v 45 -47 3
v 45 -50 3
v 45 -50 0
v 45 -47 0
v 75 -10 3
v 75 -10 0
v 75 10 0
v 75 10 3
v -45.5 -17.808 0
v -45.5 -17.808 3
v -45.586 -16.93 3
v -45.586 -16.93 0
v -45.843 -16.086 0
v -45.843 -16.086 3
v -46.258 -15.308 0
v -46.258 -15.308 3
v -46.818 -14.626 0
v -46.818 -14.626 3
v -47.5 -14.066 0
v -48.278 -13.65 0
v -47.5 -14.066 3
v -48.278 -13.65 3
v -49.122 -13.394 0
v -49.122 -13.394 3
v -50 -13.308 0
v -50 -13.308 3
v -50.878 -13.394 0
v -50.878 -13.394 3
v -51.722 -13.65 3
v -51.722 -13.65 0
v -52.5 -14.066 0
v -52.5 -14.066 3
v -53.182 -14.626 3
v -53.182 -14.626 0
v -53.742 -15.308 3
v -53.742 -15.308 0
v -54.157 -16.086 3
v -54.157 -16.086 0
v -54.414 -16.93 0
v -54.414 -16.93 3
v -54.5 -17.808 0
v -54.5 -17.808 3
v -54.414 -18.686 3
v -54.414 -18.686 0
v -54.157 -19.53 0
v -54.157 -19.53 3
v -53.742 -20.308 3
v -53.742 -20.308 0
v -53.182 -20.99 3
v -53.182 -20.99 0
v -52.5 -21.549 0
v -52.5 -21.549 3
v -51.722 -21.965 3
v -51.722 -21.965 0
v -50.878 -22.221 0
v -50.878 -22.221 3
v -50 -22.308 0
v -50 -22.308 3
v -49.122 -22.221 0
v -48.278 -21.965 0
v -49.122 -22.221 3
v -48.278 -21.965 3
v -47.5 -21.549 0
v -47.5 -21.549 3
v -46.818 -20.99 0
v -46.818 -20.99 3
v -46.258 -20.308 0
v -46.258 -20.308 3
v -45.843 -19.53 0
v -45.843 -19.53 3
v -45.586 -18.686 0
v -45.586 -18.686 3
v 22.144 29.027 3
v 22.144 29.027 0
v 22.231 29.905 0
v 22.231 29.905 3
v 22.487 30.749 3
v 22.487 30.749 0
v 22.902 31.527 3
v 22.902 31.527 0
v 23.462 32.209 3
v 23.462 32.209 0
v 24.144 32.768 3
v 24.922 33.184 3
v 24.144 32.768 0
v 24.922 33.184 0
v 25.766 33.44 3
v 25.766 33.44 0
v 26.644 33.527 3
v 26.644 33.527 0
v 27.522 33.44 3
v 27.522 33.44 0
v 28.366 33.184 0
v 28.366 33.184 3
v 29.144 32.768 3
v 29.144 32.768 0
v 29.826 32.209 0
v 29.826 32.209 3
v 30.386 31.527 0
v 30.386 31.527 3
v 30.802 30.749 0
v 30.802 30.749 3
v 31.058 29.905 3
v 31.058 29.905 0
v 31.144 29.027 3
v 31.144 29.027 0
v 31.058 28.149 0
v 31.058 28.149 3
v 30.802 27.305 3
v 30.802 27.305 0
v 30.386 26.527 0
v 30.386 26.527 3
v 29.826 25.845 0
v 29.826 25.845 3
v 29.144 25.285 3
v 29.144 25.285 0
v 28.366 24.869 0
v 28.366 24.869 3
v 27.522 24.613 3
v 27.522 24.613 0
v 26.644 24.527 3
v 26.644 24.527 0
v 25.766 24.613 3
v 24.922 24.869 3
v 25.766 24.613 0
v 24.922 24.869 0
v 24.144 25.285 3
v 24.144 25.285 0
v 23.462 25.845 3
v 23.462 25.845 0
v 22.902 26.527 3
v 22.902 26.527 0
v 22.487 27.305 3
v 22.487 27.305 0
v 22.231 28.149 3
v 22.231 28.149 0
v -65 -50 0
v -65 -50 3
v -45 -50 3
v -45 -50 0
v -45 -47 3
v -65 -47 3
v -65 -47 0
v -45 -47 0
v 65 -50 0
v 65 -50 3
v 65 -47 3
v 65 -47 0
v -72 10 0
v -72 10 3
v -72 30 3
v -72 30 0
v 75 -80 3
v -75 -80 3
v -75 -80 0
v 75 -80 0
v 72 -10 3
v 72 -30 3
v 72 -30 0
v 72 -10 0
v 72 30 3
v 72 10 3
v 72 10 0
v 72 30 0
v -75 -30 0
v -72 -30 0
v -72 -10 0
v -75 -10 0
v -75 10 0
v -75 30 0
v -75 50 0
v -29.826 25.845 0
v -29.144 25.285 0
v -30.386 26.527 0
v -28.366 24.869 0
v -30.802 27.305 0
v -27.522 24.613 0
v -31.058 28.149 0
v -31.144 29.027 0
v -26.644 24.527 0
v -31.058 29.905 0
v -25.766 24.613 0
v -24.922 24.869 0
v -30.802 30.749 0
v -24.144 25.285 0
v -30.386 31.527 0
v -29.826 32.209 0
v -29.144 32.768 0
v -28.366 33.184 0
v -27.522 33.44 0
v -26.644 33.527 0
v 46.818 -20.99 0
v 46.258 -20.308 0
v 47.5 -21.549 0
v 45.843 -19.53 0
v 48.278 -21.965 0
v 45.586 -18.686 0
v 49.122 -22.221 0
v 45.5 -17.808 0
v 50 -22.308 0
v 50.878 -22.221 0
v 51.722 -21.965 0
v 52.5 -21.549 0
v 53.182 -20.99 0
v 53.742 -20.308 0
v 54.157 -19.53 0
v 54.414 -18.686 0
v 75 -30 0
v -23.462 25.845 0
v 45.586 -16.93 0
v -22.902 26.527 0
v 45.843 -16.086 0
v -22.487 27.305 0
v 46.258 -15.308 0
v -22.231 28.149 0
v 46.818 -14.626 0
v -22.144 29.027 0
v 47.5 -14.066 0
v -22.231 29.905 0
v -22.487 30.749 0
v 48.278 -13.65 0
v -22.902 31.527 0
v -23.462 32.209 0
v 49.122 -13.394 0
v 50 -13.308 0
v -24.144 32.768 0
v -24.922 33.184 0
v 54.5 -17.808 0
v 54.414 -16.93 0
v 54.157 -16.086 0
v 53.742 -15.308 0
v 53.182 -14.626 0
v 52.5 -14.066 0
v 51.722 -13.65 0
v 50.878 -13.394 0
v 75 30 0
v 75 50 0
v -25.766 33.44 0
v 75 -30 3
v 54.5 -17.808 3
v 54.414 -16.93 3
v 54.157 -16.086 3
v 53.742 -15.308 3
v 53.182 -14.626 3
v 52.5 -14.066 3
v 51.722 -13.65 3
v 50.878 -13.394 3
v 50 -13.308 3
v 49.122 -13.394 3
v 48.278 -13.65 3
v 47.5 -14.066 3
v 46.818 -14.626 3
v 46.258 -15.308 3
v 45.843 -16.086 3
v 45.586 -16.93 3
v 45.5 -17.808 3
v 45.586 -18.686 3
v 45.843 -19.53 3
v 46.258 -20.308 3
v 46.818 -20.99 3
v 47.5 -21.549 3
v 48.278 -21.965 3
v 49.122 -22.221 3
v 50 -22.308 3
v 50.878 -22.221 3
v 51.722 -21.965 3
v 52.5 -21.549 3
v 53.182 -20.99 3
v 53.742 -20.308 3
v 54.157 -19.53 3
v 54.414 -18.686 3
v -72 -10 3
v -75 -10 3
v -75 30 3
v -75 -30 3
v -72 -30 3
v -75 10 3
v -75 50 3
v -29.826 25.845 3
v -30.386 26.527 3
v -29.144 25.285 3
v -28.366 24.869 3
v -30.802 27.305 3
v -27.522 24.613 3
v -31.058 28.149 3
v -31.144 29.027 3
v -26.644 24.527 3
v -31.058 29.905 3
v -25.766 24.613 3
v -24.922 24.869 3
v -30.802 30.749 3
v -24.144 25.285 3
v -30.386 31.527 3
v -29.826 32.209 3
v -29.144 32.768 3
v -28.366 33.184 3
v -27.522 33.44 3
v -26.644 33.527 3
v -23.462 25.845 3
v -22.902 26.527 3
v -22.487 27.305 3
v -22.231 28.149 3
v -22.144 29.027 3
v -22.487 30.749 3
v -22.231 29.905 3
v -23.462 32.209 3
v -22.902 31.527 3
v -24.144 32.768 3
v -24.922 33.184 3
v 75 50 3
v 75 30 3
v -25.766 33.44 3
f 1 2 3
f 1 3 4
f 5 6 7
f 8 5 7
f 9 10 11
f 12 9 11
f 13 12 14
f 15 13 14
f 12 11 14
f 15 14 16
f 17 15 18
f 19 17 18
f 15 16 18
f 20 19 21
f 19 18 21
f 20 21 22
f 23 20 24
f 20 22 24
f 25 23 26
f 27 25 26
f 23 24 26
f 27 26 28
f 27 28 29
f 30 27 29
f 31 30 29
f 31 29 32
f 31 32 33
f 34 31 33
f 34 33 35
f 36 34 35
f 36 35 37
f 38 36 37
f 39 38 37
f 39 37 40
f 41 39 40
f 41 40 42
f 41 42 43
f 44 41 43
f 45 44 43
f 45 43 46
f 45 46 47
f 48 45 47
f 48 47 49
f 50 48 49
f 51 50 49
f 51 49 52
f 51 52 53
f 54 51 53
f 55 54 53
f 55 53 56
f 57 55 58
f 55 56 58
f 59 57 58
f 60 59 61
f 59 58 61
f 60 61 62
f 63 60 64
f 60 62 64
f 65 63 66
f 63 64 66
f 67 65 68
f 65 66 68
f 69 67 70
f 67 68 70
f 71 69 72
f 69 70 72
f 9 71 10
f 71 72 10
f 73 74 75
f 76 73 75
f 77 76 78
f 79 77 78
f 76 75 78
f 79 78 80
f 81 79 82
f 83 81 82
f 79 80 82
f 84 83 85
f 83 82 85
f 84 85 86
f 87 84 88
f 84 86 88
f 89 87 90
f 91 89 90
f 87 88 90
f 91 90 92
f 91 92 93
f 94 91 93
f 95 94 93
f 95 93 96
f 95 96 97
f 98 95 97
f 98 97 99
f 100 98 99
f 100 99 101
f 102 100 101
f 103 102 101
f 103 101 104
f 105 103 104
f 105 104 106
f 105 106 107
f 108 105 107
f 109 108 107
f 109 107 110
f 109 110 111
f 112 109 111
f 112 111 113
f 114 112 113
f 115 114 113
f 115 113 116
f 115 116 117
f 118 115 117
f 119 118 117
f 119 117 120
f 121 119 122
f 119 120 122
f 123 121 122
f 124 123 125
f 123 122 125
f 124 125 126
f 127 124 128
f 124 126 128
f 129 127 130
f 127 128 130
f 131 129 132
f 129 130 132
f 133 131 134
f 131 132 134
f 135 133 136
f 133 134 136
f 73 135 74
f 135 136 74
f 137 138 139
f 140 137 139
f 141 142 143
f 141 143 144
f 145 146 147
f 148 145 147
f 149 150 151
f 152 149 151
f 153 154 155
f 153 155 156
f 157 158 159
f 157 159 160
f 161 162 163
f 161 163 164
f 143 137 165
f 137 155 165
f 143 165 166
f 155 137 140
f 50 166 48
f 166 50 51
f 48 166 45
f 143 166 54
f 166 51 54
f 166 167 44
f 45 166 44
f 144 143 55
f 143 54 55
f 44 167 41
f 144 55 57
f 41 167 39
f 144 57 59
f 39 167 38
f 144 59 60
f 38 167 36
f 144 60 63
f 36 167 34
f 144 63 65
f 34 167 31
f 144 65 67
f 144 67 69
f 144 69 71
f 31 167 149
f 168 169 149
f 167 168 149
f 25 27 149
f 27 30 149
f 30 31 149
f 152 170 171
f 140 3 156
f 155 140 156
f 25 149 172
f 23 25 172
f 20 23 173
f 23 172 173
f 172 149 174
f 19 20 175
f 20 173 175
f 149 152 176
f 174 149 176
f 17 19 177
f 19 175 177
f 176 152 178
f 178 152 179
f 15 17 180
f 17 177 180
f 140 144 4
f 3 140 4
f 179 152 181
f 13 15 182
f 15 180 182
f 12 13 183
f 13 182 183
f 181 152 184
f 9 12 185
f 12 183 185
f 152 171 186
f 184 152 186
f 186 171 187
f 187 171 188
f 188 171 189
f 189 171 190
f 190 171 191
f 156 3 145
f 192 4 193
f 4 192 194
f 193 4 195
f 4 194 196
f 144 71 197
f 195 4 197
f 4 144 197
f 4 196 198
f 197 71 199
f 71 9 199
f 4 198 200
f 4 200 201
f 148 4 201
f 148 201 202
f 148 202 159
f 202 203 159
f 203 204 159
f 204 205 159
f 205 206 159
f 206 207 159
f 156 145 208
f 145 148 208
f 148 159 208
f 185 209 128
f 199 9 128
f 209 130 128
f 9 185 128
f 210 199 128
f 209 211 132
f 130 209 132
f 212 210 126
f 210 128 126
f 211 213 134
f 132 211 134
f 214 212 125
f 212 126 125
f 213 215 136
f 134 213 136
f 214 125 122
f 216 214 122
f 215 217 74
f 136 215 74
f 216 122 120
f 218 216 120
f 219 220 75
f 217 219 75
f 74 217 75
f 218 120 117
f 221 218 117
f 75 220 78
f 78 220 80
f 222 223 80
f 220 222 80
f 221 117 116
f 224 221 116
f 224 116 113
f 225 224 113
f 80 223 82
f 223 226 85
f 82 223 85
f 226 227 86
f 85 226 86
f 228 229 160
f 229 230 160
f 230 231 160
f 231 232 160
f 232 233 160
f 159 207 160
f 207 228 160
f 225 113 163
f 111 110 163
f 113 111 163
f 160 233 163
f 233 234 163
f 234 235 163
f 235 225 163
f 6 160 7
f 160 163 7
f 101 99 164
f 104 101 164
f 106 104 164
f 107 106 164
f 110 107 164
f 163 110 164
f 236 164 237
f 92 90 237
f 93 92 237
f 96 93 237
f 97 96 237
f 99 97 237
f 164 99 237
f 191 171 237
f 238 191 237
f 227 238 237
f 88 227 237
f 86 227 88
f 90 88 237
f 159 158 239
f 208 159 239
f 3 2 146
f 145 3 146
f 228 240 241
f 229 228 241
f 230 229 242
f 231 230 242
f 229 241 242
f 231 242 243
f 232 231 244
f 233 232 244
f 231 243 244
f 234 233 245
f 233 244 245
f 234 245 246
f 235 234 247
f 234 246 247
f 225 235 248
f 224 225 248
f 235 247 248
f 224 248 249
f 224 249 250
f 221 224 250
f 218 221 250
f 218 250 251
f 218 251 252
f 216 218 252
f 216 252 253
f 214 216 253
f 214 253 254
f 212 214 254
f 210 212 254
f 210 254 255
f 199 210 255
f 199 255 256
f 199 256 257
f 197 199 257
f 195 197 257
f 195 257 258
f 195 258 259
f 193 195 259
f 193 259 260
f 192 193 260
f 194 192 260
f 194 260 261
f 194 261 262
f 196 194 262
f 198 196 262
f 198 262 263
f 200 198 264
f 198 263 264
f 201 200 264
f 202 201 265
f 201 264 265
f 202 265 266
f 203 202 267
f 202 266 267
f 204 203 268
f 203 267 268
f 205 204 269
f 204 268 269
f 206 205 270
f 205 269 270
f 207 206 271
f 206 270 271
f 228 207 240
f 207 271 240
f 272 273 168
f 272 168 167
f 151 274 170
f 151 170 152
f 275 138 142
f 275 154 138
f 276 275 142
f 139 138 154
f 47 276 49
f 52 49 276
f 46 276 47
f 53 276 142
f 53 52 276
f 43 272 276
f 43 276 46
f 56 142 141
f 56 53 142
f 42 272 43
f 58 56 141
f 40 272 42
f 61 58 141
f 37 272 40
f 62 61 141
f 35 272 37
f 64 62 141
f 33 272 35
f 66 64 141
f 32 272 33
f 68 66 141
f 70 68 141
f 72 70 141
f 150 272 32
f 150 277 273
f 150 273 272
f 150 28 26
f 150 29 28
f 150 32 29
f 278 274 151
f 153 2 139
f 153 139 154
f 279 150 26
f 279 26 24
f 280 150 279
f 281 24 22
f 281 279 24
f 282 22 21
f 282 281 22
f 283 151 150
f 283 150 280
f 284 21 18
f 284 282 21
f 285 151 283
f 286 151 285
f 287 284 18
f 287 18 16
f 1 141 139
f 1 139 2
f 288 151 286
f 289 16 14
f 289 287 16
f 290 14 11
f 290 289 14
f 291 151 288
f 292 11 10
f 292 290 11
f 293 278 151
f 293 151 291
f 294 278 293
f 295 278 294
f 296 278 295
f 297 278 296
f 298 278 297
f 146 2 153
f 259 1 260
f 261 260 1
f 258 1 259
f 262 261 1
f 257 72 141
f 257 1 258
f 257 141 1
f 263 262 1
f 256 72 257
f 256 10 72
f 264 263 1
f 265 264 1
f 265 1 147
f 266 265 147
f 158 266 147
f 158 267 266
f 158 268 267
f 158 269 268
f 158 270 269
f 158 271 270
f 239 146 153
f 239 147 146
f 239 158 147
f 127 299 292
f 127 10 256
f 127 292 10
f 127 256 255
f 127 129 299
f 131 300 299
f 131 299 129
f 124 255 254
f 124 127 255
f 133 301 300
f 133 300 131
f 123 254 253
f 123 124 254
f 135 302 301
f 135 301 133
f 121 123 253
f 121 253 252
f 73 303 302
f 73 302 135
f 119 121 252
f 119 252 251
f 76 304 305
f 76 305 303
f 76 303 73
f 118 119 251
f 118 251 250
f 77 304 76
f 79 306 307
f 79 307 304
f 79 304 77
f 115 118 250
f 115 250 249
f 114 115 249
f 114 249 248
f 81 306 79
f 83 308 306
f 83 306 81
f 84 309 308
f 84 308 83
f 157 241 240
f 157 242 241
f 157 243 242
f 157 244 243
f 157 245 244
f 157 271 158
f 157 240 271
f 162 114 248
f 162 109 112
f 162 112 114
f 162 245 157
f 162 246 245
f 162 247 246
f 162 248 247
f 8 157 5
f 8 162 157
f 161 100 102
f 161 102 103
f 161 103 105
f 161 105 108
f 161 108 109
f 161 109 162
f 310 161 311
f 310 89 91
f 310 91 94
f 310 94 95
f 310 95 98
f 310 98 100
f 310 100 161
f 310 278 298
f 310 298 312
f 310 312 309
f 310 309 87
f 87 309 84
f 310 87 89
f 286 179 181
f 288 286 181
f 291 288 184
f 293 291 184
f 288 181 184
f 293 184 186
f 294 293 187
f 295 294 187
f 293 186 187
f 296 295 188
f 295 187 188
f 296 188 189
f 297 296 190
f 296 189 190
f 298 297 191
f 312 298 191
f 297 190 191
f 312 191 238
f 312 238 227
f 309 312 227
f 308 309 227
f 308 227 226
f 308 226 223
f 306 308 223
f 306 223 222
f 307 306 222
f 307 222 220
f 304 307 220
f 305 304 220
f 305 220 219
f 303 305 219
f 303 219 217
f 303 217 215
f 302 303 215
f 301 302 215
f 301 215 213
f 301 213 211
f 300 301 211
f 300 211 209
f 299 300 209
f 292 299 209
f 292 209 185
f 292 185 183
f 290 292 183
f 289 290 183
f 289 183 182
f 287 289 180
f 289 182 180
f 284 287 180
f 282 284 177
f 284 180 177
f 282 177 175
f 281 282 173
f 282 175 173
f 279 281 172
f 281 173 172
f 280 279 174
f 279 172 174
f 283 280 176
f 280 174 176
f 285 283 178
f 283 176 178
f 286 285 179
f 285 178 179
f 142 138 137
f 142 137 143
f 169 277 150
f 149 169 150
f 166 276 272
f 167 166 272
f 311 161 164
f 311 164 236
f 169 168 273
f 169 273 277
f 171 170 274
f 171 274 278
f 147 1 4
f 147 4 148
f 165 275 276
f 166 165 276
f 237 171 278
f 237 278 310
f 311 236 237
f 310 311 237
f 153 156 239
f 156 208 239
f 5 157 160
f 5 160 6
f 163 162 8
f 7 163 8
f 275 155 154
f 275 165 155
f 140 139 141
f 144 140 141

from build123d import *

# Parameters (mm, degrees)
SKETCH1_W           = 150
SKETCH1_H           = 100
BOSS_EXTRUDE1_DEPTH = 3
SKETCH2_W           = 3
SKETCH2_H           = 20
SKETCH2_W_2         = 20
SKETCH2_H_2         = 3
CUT_EXTRUDE1_DEPTH  = 3
SKETCH3_W           = 150
SKETCH3_H           = 3
BOSS_EXTRUDE2_DEPTH = 30
SKETCH5_R           = 4.5
CUT_EXTRUDE2_DEPTH  = 10
SKETCH6_R           = 4.5
CUT_EXTRUDE3_DEPTH  = 10


with BuildPart() as part:
    # Sketch1 → Boss-Extrude1 (new body)
    with BuildSketch(Plane.XY):
        Rectangle(SKETCH1_W, SKETCH1_H)
    extrude(amount=BOSS_EXTRUDE1_DEPTH)

    # Sketch2 → Cut-Extrude1 (cut)
    with BuildSketch(Plane.XY.offset(3)):
        with Locations((73.5, 20)):
            Rectangle(SKETCH2_W, SKETCH2_H)
        with Locations((73.5, -20)):
            Rectangle(SKETCH2_W, SKETCH2_H)
        with Locations((-73.5, -20)):
            Rectangle(SKETCH2_W, SKETCH2_H)
        with Locations((-73.5, 20)):
            Rectangle(SKETCH2_W, SKETCH2_H)
        with Locations((-55, -48.5)):
            Rectangle(SKETCH2_W_2, SKETCH2_H_2)
        with Locations((55, -48.5)):
            Rectangle(SKETCH2_W_2, SKETCH2_H_2)
    extrude(amount=-CUT_EXTRUDE1_DEPTH, mode=Mode.SUBTRACT)

    # Sketch3 → Boss-Extrude2 (add)
    with BuildSketch(Plane.XZ.offset(50)):
        with Locations((0, 1.5)):
            Rectangle(SKETCH3_W, SKETCH3_H)
    extrude(amount=BOSS_EXTRUDE2_DEPTH)

    # Sketch5 → Cut-Extrude2 (cut)
    with BuildSketch(Plane.XY.offset(3)):
        with Locations((50, -17.807715926)):
            Circle(SKETCH5_R)
        with Locations((-50, -17.807715926)):
            Circle(SKETCH5_R)
    extrude(amount=-CUT_EXTRUDE2_DEPTH, mode=Mode.SUBTRACT)

    # Sketch6 → Cut-Extrude3 (cut)
    with BuildSketch(Plane(origin=(0, 0, 0), x_dir=(-1, 0, 0), z_dir=(0, 0, -1))):
        with Locations((26.644067797, 29.026784983)):
            Circle(SKETCH6_R)
        with Locations((-26.644067797, 29.026784983)):
            Circle(SKETCH6_R)
    extrude(amount=-CUT_EXTRUDE3_DEPTH, mode=Mode.SUBTRACT)


solid = part.part
